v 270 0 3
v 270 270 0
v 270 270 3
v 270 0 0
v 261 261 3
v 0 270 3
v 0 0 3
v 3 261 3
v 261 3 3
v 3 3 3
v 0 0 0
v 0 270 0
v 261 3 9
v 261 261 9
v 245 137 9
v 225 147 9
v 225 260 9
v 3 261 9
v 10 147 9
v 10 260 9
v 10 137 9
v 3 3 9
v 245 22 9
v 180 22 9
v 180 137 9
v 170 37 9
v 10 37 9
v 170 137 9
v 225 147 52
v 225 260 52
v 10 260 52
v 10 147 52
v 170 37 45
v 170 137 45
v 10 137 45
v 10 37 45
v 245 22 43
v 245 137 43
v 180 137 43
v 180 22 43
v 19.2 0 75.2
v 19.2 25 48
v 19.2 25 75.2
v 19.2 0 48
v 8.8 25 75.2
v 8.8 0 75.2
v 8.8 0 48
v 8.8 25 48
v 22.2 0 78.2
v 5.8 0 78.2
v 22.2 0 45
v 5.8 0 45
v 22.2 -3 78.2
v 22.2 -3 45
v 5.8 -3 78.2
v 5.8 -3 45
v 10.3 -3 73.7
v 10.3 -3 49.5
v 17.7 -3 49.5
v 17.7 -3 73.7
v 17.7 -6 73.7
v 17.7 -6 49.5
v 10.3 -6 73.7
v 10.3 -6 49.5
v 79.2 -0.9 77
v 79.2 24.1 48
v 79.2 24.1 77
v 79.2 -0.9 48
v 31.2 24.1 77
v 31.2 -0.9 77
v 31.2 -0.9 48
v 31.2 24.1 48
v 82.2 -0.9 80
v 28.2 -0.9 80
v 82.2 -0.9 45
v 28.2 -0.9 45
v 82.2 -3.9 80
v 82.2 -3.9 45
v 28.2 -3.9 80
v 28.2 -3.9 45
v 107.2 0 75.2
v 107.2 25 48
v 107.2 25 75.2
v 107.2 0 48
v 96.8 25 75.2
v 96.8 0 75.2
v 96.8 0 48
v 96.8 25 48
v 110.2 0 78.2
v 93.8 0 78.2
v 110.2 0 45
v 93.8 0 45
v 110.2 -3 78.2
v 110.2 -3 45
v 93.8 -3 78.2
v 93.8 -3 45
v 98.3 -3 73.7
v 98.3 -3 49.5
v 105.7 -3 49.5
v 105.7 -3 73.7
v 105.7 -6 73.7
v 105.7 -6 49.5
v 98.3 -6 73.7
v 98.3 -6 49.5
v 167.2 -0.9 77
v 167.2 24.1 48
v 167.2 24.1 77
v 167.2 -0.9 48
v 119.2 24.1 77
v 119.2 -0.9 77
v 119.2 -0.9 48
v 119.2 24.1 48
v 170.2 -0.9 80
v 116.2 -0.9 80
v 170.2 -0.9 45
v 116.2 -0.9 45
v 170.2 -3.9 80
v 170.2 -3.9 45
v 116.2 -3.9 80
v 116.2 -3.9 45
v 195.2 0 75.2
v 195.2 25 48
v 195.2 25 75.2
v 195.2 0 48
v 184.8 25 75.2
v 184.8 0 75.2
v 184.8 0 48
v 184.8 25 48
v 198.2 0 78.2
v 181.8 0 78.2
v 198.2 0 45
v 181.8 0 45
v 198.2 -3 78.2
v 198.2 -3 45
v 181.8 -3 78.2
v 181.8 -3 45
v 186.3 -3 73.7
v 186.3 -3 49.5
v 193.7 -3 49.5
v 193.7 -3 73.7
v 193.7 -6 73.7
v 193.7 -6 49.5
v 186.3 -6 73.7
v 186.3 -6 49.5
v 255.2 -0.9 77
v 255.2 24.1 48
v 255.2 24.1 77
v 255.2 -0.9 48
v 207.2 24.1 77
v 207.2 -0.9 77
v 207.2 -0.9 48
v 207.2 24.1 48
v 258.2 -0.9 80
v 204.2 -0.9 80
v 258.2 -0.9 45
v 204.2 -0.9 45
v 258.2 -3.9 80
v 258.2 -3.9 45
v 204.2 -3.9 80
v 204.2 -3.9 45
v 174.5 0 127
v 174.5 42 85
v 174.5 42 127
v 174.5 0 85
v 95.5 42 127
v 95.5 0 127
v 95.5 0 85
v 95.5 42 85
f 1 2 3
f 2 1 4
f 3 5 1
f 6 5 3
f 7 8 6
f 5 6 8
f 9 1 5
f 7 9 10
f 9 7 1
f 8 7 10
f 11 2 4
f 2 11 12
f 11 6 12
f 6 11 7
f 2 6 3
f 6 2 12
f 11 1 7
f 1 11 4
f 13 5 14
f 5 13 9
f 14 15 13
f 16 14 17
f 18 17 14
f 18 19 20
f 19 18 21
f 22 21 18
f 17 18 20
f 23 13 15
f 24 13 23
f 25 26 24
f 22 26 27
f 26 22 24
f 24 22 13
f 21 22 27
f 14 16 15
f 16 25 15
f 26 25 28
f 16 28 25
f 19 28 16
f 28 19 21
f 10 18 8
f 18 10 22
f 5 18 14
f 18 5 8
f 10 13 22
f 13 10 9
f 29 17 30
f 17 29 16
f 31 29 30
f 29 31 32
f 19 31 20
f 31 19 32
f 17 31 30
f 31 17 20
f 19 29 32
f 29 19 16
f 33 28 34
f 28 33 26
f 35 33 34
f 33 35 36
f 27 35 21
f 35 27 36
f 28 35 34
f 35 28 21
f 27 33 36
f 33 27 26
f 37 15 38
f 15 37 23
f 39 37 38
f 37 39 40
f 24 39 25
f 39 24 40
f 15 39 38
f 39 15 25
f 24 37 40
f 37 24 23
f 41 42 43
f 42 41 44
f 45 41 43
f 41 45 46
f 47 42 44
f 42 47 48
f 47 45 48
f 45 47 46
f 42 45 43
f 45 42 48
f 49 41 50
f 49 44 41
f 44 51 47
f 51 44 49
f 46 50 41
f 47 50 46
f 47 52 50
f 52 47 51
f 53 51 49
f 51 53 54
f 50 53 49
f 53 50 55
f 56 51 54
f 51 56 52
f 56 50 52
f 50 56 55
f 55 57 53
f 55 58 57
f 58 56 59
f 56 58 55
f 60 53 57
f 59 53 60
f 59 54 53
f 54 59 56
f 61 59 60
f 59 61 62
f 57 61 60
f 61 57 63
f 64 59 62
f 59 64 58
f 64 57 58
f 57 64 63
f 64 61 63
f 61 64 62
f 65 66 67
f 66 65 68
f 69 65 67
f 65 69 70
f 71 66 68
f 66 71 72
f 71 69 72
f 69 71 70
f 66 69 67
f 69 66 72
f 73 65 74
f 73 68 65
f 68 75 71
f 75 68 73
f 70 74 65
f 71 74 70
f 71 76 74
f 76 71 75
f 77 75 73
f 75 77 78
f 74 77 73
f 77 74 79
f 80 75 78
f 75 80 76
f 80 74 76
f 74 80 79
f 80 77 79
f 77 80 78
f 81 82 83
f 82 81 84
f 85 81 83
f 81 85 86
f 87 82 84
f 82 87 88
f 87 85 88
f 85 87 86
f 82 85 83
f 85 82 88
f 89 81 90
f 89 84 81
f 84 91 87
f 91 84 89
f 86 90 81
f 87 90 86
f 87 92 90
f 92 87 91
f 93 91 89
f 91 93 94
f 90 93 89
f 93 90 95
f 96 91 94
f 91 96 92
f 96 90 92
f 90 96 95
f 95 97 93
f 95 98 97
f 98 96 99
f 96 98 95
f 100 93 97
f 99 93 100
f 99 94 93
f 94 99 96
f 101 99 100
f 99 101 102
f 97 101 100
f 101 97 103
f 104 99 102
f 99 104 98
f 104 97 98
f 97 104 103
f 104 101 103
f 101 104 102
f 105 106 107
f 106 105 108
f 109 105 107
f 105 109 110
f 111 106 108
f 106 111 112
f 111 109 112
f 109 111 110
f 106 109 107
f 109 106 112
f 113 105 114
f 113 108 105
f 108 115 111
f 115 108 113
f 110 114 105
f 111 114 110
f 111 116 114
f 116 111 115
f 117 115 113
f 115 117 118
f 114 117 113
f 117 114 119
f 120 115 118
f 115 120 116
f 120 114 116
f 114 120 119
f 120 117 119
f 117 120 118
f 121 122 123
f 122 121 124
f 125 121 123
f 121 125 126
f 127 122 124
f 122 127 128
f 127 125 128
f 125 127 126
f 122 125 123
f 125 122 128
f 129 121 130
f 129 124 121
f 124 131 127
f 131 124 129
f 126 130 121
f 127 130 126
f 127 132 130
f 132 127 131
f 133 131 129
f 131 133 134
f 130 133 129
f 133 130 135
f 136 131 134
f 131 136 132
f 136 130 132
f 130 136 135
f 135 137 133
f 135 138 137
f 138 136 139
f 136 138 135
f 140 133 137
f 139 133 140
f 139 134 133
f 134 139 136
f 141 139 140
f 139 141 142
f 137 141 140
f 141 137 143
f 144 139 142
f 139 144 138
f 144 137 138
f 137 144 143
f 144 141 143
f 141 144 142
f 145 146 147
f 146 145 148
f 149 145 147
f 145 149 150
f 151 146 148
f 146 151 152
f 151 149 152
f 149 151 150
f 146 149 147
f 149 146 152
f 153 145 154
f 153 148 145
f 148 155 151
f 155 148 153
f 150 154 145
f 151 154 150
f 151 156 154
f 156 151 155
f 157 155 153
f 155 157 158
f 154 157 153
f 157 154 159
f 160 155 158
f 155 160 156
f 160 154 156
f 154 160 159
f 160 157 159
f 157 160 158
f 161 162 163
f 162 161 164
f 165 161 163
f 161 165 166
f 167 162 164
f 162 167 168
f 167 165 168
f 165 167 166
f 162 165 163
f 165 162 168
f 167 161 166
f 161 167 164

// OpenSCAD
// file: psu-components.scad
include <psu-dimensions.scad>

module psu12v() {
     color("cyan") cube([psu12v_length, psu12v_width, psu12v_height]);
}

module psu5v() {
     color("magenta") cube([psu5v_length, psu5v_width, psu5v_height]);
}

module psu36v() {
     color("yellow") cube([psu36v_length, psu36v_width, psu36v_height]);
}

module adjuster() {
     color("green") cube([adjuster_width, adjuster_depth, adjuster_height]);
}

module mains_switch() {
     color("grey") union() {
          cube([switch_width, switch_depth, switch_height]);
          translate([-panel_lip_width, -panel_lip_depth, -panel_lip_width]) {
               cube([switch_width + panel_lip_width * 2, panel_lip_depth, switch_height + panel_lip_width * 2]);
          }
     }
     translate([(switch_width - rocker_width) / 2, -rocker_depth, (switch_height - rocker_height) / 2]) {
          color("red") {
               cube([rocker_width, rocker_depth, rocker_height]);
          }
     }
}

module panel_meter() {
     color("grey") union() {
          cube([meter_width, meter_depth, meter_height]);
          translate([-panel_lip_width, -panel_lip_depth, -panel_lip_width]) {
               cube([meter_width + panel_lip_width * 2, panel_lip_depth, meter_height + panel_lip_width * 2]);
          }
     }
}

module meter_and_switch() {
    translate([-meter_and_switch_width/2, 0, -meter_and_switch_height/2]) {
        mains_switch();
        translate([switch_width + meter_switch_gap, (switch_height - meter_height)/2]) {
            panel_meter();
        }
    }
}

module one_front_components() {
     translate([half_section_width, 0, meter_and_switch_offset_from_base + meter_and_switch_height/2]) meter_and_switch();
}

module front_components() {
     for (i=[0:sections-1]) {
          translate([i * section_width, 0]) {
               one_front_components();
          }
     }
     translate([(total_width - adjuster_width)/2, 0, adjuster_y_offset]) adjuster();
}

module internal_components() {
     psu12v_offset_from_front = total_depth - gap_around_components - psu12v_width;
     psu5v_offset_from_12v = - (psu5v_width + gap_around_components);
     psu36v_offset_from_12v = - (psu36v_width + gap_around_components);
     translate([0, 0, top_of_lower_base]) {
          translate([gap_around_components, psu12v_offset_from_front]) {
               psu12v();
               translate([0, psu5v_offset_from_12v]) {
                    psu5v();
               }
               translate([psu5v_length + gap_around_components, psu36v_offset_from_12v]) {
                    psu36v();
               }
          }
          front_components();
     }
}
// file: psu-case-parts.scad
include <psu-dimensions.scad>

module lower_base() {
     cube([total_width,
           total_depth,
           outer_thickness],
          center=false);
}

module upper_base() {
     translate([outer_thickness, outer_thickness]) {
          cube([total_width-2*inner_thickness,
                total_depth-2*inner_thickness,
                inner_thickness],
               center=false);
     }
}

module base() {
     color("red") lower_base();
     color("green") translate([0, 0, outer_thickness]) upper_base();
}

module binding_post_hole_pair(diameter, spacing, join) {
     translate([-spacing/2, 0]) circle(d=diameter);
     translate([spacing/2, 0]) circle(d=diameter);
     if (join) {
         translate([-spacing/2, -diameter/2]) square([spacing, diameter]);
     }
}

module meter_and_switch_cutout() {
    translate([-meter_and_switch_width/2, -meter_and_switch_height/2]) {
        square([switch_width, switch_height]);
        translate([switch_width + meter_switch_gap, (switch_height - meter_height)/2]) {
            square([meter_width, meter_height]);
        }
    }
}
// file: psu-dimensions.scad
total_width = 270;
total_depth = 270;
total_height = 135;

outer_thickness = 3;
inner_thickness = 6;

top_of_lower_base = outer_thickness;
top_of_base = top_of_lower_base + inner_thickness;

margin = 15;
cutting_space = 5;

voltages = ["5V", "3--36V", "12V"];

sections = len(voltages);

section_width = (total_width - 2 * outer_thickness) / 3;

half_section_width = section_width / 2;

inner_depth = total_depth - outer_thickness;

panel_lip_width = 3;
panel_lip_depth = 3;

switch_height = 27.2;
switch_width = 10.4;
switch_depth = 25;               /* TODO: measure this */

meter_width = 48;
meter_height = 29;
meter_depth = 25;               /* TODO: measure this */

rocker_width = switch_width - 3;
rocker_depth = 6;
rocker_height = switch_height - 3;

meter_switch_gap = 12;

meter_and_switch_height = max(meter_height, switch_height);
meter_and_switch_width = meter_width + meter_switch_gap + switch_width;
meter_and_switch_offset_from_base = 45;

mains_inlet_width = 31;
mains_inlet_height = 27;

switch_offset = 30;
meter_offset = 100;

adjuster_width = 79;
adjuster_height = 42;
adjuster_depth = 42;
adjuster_y_offset = meter_and_switch_offset_from_base + meter_and_switch_height + 8;

clamp_connector_length = 20;
clamp_connector_width = 18;
wire_clamp_depth = clamp_connector_length + 15;

binding_post_hole_inner_diameter = 15;
binding_post_hole_outer_diameter = 3;
binding_post_rows = 6;
binding_post_spacing = 20;
binding_post_row_spacing = 25;
binding_post_offset = binding_post_row_spacing + wire_clamp_depth;

ventilation_panel_start = mains_inlet_width + margin * 3;
ventilation_hole_diameter = 10;
ventilation_hole_spacing = ventilation_hole_diameter * 1.5;
rear_ventilation_holes_per_row = (total_width - (ventilation_panel_start + margin * 2)) / ventilation_hole_spacing;
rear_ventilation_hole_rows = (total_height  - (margin * 2)) / ventilation_hole_spacing;
side_ventilation_area_length = total_depth/3;
side_ventilation_holes_per_row = side_ventilation_area_length / ventilation_hole_spacing;
side_ventilation_hole_rows = (total_height  - (margin * 2)) / ventilation_hole_spacing;

/* some internal parts so I can experiment with layout */

psu12v_length = 215;
psu12v_width = 113;
psu12v_height = 49;

psu5v_length = 160;
psu5v_width = 100;
psu5v_height = 42;

psu36v_length = 65;
psu36v_width = 115;
psu36v_height = 40;

/* layout */

gap_around_components = 10;
// main file
include <psu-dimensions.scad>
include <psu-case-parts.scad>
include <psu-components.scad>

module components_on_base() {
     base();
     internal_components();
}

components_on_base();
